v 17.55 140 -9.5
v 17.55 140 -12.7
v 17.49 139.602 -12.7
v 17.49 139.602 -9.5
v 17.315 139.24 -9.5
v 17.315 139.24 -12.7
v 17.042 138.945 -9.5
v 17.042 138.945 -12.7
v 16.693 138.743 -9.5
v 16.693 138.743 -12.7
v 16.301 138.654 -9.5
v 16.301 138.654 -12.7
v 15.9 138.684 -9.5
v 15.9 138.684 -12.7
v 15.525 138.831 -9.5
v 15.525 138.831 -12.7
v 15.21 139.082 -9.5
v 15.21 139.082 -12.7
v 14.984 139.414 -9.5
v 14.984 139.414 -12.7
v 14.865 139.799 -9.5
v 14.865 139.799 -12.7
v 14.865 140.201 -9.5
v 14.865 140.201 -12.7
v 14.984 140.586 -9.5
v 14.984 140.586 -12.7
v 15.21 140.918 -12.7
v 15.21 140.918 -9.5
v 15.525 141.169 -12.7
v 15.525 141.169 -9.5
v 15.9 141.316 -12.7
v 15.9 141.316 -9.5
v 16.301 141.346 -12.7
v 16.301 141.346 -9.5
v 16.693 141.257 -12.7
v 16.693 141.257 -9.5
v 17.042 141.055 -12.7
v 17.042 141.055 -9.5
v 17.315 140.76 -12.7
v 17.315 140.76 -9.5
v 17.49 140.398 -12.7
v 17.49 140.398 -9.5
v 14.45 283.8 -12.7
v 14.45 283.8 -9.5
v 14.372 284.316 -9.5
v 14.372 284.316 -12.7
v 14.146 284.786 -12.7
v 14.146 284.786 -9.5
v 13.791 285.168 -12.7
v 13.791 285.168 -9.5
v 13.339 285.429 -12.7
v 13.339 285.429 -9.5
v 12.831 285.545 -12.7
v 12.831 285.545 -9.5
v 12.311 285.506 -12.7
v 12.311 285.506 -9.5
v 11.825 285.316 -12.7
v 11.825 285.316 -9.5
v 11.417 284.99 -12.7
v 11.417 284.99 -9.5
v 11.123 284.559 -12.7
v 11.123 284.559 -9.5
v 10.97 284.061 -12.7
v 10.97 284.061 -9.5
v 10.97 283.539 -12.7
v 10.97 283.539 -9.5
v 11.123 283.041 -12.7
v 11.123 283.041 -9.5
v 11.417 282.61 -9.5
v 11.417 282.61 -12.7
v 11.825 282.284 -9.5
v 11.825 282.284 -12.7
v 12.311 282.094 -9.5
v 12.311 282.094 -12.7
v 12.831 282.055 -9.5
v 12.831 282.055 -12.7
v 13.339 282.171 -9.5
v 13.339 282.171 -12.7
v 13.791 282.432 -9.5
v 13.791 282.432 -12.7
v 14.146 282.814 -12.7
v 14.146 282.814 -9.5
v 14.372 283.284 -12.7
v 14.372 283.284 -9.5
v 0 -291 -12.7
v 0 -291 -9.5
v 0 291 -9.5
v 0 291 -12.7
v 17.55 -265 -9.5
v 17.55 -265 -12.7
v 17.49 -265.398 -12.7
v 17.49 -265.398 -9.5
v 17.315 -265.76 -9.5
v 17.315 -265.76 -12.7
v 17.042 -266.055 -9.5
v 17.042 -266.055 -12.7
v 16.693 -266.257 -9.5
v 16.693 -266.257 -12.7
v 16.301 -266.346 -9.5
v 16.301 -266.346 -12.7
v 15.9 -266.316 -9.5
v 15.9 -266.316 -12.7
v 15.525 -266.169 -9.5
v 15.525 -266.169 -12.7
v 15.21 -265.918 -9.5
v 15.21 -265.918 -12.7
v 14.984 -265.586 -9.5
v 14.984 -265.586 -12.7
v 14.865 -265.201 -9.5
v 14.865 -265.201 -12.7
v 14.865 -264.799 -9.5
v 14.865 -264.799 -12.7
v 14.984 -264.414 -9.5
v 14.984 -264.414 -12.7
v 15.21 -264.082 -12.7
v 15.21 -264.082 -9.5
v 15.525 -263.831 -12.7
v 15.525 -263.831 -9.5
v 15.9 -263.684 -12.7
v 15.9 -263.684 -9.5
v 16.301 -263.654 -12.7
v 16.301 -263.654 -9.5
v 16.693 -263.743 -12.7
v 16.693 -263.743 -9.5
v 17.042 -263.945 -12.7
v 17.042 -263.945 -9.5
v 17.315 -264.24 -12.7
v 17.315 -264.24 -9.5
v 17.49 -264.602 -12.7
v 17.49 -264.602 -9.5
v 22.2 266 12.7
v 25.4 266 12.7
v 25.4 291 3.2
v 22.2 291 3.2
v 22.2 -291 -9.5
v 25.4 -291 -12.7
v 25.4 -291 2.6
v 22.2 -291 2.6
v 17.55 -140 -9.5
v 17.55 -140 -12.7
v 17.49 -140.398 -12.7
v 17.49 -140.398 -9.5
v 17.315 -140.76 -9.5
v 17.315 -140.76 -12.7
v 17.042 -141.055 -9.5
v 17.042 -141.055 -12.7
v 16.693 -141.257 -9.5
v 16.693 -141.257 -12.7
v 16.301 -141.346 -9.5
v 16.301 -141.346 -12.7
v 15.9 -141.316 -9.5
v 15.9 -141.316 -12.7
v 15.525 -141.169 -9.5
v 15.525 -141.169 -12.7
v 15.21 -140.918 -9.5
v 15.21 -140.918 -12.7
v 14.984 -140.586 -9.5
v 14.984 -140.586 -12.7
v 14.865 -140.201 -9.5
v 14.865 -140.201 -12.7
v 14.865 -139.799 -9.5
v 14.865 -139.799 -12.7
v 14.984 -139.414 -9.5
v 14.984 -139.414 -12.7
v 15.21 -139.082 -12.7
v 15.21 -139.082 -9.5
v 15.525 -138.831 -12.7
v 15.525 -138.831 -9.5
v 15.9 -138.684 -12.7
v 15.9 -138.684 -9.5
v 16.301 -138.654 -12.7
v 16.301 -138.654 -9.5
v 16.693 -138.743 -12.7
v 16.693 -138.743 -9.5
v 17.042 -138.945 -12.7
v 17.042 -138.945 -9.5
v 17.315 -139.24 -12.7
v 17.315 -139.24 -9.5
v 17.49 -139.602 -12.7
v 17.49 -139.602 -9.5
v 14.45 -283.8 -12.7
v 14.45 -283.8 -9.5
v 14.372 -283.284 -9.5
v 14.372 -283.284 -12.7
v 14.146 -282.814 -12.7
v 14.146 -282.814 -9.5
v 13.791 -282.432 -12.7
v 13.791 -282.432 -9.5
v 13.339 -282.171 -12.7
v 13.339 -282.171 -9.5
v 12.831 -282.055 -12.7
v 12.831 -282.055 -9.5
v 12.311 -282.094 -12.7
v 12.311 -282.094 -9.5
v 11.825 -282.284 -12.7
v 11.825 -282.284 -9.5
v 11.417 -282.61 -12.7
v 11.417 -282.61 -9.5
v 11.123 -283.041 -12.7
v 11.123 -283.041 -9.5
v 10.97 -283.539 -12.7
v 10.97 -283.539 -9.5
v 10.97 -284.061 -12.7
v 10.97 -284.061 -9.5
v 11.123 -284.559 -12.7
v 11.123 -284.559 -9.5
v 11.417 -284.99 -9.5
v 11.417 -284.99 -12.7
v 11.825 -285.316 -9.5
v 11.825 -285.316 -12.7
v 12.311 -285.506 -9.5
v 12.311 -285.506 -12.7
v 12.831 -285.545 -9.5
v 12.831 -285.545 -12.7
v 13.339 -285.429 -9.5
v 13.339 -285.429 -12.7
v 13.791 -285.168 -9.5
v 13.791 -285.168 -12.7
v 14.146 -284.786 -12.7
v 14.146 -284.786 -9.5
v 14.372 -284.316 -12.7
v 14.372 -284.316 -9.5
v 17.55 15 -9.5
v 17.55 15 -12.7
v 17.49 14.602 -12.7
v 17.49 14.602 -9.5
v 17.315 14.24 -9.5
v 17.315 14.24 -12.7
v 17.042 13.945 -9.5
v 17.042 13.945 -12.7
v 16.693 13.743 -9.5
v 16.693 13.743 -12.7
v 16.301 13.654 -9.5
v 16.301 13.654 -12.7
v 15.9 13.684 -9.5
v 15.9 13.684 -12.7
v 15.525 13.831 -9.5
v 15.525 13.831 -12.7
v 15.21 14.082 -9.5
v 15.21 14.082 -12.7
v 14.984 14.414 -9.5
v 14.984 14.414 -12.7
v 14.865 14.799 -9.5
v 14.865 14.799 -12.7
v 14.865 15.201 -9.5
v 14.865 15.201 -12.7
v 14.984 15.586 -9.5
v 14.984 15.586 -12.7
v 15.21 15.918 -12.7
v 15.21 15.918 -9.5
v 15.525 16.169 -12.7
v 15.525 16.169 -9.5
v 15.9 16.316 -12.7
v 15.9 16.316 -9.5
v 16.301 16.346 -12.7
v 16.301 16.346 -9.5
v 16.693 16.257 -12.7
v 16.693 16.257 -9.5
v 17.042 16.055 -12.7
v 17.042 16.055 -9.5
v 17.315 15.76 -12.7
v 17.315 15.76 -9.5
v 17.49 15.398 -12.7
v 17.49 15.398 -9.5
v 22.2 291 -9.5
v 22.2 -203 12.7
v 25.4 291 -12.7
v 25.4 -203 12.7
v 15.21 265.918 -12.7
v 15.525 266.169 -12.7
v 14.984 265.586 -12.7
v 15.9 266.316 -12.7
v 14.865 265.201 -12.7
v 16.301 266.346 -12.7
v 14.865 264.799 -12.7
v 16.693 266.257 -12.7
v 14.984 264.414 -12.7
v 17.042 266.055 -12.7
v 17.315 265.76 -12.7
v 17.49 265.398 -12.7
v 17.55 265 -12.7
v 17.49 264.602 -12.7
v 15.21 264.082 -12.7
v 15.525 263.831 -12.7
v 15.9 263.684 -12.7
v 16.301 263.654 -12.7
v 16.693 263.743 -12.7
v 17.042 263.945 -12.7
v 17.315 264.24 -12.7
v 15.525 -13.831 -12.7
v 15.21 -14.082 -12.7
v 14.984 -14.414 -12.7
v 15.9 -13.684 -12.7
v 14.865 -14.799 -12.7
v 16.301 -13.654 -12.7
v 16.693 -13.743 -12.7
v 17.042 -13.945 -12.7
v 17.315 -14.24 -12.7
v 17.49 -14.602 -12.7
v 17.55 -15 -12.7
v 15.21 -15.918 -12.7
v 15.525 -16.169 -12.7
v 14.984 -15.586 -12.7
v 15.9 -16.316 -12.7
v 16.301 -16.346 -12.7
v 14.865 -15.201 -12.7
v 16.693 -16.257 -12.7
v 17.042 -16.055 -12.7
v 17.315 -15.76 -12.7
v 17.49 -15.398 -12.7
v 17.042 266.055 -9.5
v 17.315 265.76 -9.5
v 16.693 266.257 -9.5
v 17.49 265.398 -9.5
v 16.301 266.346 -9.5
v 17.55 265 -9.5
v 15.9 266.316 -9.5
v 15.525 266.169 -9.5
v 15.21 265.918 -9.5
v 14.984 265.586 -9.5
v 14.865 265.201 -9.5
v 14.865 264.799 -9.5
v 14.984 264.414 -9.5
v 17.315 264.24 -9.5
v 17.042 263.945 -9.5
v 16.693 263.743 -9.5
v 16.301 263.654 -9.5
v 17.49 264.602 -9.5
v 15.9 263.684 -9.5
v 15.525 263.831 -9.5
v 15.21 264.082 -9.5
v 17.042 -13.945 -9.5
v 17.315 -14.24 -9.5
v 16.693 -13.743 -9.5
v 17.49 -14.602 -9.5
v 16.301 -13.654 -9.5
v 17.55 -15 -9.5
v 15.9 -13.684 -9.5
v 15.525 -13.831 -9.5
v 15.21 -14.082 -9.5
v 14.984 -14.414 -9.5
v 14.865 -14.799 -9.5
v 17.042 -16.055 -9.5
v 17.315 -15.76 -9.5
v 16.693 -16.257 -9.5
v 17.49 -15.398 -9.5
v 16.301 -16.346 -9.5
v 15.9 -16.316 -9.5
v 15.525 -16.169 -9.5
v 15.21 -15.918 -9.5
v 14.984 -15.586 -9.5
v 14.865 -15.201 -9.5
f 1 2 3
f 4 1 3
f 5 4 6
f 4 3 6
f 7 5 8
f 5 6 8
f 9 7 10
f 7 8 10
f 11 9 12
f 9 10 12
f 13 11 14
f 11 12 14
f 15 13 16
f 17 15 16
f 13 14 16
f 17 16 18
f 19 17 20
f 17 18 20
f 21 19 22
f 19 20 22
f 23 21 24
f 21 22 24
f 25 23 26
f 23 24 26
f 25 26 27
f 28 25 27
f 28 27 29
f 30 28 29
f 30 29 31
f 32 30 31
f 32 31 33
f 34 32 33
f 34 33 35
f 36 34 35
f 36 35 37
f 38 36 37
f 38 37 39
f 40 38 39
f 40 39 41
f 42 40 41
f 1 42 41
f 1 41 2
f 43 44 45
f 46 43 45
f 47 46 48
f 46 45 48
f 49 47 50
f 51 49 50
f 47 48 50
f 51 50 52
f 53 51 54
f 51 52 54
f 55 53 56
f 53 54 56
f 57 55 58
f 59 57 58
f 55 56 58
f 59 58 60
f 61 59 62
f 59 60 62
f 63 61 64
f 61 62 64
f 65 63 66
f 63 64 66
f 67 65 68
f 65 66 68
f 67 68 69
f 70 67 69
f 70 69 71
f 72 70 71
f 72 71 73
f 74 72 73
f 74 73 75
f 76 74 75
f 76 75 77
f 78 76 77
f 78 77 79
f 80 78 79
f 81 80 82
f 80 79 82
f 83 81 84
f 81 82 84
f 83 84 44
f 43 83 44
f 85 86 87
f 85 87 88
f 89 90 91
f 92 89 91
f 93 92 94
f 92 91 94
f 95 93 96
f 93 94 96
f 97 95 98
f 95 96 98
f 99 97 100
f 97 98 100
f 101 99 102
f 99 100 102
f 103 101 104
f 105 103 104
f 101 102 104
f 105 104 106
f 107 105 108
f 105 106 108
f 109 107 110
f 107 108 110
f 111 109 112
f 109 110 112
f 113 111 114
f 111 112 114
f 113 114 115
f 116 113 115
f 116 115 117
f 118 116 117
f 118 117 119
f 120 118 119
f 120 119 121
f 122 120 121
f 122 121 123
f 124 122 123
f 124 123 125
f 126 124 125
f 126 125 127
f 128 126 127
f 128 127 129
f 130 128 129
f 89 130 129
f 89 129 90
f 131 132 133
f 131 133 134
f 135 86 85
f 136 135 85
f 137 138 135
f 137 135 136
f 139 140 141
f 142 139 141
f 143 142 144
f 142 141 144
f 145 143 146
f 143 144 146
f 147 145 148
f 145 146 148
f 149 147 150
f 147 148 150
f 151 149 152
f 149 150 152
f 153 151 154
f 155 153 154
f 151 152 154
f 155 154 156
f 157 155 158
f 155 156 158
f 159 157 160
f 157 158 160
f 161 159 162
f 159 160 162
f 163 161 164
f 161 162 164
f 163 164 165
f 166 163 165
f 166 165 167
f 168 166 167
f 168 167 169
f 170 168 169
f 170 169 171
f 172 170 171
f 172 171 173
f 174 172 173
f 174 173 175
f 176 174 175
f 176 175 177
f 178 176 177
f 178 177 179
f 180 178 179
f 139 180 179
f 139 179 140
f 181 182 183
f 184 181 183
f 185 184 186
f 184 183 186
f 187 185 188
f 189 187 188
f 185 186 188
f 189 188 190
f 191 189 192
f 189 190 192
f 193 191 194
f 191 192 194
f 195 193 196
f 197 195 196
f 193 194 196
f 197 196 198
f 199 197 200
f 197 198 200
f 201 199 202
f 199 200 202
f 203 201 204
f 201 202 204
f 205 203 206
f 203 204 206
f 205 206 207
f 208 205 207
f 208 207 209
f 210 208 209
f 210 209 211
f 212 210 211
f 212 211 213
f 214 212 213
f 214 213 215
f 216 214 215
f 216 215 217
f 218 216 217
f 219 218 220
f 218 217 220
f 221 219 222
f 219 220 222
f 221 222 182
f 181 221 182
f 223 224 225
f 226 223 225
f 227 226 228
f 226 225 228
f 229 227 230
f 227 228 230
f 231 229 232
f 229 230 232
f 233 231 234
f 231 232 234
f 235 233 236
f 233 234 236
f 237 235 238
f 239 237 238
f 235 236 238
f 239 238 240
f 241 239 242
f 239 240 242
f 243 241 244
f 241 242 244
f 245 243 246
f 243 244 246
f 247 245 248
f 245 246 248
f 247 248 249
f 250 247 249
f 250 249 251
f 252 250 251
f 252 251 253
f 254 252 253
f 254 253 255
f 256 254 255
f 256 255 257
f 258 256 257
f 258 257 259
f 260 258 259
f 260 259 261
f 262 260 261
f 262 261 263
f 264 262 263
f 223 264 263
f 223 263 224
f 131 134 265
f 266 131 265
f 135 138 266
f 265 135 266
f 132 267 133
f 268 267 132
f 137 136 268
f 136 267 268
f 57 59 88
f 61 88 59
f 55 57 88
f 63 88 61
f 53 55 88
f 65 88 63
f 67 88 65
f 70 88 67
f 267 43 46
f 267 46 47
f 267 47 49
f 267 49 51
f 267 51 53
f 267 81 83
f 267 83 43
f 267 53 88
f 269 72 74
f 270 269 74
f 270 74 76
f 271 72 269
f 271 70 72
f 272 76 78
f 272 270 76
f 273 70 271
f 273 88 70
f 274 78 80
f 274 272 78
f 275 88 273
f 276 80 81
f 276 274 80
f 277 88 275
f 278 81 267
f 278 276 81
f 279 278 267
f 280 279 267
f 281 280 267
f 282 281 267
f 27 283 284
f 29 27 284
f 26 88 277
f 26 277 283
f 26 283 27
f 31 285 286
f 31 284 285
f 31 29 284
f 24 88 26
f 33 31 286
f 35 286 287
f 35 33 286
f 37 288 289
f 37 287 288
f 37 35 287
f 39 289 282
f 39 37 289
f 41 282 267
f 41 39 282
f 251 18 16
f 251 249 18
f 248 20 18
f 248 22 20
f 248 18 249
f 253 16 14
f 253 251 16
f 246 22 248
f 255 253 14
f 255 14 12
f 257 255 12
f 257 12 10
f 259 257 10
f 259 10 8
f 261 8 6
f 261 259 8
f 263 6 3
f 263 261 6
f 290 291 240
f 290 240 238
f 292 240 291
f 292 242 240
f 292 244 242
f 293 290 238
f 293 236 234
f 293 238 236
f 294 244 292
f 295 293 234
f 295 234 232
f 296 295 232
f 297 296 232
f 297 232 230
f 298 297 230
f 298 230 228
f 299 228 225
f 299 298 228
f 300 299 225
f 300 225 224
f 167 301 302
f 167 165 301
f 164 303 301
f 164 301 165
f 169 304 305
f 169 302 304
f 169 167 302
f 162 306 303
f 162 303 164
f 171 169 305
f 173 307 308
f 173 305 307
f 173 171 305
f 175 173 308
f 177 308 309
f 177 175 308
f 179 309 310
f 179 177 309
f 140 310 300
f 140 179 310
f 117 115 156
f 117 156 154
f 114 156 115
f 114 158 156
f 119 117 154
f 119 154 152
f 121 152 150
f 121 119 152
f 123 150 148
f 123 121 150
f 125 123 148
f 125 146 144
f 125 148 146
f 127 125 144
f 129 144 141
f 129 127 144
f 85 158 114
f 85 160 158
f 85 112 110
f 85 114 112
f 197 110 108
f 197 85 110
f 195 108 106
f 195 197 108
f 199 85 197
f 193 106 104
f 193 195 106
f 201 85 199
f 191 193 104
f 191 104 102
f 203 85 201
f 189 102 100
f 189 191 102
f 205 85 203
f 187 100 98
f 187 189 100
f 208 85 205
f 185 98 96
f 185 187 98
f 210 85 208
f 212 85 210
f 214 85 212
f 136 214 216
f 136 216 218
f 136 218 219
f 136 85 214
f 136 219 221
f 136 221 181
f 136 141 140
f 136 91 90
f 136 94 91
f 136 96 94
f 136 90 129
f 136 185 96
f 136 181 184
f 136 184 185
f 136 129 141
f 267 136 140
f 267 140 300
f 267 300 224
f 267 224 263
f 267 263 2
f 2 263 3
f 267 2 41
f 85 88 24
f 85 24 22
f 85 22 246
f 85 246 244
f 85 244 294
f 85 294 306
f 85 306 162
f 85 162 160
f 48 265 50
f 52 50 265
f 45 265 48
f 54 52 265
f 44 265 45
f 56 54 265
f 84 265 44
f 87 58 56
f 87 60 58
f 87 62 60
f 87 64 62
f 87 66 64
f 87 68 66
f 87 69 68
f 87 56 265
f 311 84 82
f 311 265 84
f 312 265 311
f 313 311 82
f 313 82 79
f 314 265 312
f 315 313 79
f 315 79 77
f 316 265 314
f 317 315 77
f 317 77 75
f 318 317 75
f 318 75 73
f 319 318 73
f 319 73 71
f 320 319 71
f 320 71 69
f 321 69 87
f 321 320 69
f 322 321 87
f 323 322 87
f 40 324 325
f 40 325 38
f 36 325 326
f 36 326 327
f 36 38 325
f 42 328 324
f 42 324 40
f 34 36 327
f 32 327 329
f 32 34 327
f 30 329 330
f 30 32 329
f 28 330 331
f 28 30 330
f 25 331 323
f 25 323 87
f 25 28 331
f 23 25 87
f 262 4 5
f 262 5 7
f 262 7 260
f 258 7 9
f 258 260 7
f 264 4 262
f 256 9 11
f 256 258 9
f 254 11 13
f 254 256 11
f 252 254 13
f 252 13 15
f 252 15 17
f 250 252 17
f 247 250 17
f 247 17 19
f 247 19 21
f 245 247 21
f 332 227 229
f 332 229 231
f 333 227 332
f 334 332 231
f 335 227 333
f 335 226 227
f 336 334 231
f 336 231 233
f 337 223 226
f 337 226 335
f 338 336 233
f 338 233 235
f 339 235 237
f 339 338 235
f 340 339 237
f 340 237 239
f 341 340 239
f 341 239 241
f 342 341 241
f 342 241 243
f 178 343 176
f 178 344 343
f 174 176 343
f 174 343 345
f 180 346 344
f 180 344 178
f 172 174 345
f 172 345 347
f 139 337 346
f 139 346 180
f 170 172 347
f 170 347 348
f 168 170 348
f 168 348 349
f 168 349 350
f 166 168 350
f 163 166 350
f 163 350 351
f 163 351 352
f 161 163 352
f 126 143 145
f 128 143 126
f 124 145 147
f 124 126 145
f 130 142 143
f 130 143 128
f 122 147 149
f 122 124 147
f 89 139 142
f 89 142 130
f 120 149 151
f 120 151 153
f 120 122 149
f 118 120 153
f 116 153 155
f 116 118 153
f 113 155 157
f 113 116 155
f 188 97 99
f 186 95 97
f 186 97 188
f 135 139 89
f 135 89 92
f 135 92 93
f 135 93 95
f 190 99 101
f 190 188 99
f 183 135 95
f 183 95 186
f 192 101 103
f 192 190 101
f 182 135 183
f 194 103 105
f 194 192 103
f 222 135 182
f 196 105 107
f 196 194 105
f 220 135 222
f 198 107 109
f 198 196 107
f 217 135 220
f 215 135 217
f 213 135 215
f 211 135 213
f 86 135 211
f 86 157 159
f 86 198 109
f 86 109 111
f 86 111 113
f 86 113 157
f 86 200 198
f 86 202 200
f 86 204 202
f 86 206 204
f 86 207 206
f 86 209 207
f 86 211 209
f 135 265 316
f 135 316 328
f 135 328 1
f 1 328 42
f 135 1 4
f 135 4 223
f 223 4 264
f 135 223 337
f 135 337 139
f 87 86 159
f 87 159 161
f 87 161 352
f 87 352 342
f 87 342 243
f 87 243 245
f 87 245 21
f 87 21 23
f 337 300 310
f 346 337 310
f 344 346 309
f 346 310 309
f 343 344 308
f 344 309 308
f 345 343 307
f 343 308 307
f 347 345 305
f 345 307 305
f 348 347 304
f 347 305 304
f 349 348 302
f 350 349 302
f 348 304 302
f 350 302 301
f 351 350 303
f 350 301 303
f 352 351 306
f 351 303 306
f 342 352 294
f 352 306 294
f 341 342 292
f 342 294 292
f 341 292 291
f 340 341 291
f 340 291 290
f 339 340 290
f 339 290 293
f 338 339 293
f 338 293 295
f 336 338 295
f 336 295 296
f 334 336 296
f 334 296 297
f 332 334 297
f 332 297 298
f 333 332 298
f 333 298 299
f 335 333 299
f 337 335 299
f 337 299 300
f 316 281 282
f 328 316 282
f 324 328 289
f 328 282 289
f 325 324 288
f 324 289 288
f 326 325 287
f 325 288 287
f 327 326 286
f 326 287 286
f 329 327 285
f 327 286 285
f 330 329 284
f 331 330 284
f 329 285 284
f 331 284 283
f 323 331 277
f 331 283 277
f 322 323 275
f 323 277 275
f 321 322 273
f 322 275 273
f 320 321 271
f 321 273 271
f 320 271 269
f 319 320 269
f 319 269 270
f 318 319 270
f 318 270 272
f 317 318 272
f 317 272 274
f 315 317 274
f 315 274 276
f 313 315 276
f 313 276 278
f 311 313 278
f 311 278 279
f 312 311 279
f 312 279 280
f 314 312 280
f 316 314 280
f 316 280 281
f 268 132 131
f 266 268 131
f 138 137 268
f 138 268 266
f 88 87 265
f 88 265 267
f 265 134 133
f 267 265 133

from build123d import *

# Parameters (mm, degrees)
F1_DEPTH = 291
F4_SIZE2 = 25
F4_SIZE  = 9.5
F5_SIZE2 = 10.1
F5_SIZE  = 88
F7_R     = 1.75
F8_DEPTH = 3.2
F3_R     = 1.35
F9_DEPTH = 25


with BuildPart() as f1:
    # F0 (on Front) → F1 (new body, symmetric)
    with BuildSketch(Plane.XZ):
        Polygon((25.4, 12.7), (22.2, 12.7), (22.2, -9.5), (0, -9.5), (0, -12.7), (25.4, -12.7), align=None)
    extrude(amount=F1_DEPTH, both=True)

    # F4
    f4_edges = [f1.edges().sort_by_distance(p)[0] for p in [
        (23.8, 291, 12.7),
    ]]
    f4_side = f1.faces().sort_by_distance((23.8, 291, 12.34079))[0]
    chamfer(f4_edges, length=F4_SIZE, length2=F4_SIZE2, reference=f4_side)

    # F5
    f5_edges = [f1.edges().sort_by_distance(p)[0] for p in [
        (23.8, -291, 12.7),
    ]]
    f5_side = f1.faces().sort_by_distance((23.8, -12.5, 12.7))[0]
    chamfer(f5_edges, length=F5_SIZE, length2=F5_SIZE2, reference=f5_side)

    # F7 (on face) → F8 (cut, through all)
    with BuildSketch(Plane.XY.offset(-9.5)):
        with Locations((12.7, -283.8)):
            Circle(F7_R)
        with Locations((12.7, 283.8)):
            Circle(F7_R)
    extrude(amount=-F8_DEPTH, mode=Mode.SUBTRACT)

    # F3 (on face) → F9 (cut)
    with BuildSketch(Plane(origin=(0, 0, -12.7), x_dir=(1, 0, 0), z_dir=(0, 0, -1))):
        with Locations((16.2, 15)):
            Circle(F3_R)
        with Locations((16.2, -15)):
            Circle(F3_R)
        with Locations((16.2, 140)):
            Circle(F3_R)
        with Locations((16.2, 265)):
            Circle(F3_R)
        with Locations((16.2, -140)):
            Circle(F3_R)
        with Locations((16.2, -265)):
            Circle(F3_R)
    extrude(amount=-F9_DEPTH, mode=Mode.SUBTRACT)


solid = f1.part
